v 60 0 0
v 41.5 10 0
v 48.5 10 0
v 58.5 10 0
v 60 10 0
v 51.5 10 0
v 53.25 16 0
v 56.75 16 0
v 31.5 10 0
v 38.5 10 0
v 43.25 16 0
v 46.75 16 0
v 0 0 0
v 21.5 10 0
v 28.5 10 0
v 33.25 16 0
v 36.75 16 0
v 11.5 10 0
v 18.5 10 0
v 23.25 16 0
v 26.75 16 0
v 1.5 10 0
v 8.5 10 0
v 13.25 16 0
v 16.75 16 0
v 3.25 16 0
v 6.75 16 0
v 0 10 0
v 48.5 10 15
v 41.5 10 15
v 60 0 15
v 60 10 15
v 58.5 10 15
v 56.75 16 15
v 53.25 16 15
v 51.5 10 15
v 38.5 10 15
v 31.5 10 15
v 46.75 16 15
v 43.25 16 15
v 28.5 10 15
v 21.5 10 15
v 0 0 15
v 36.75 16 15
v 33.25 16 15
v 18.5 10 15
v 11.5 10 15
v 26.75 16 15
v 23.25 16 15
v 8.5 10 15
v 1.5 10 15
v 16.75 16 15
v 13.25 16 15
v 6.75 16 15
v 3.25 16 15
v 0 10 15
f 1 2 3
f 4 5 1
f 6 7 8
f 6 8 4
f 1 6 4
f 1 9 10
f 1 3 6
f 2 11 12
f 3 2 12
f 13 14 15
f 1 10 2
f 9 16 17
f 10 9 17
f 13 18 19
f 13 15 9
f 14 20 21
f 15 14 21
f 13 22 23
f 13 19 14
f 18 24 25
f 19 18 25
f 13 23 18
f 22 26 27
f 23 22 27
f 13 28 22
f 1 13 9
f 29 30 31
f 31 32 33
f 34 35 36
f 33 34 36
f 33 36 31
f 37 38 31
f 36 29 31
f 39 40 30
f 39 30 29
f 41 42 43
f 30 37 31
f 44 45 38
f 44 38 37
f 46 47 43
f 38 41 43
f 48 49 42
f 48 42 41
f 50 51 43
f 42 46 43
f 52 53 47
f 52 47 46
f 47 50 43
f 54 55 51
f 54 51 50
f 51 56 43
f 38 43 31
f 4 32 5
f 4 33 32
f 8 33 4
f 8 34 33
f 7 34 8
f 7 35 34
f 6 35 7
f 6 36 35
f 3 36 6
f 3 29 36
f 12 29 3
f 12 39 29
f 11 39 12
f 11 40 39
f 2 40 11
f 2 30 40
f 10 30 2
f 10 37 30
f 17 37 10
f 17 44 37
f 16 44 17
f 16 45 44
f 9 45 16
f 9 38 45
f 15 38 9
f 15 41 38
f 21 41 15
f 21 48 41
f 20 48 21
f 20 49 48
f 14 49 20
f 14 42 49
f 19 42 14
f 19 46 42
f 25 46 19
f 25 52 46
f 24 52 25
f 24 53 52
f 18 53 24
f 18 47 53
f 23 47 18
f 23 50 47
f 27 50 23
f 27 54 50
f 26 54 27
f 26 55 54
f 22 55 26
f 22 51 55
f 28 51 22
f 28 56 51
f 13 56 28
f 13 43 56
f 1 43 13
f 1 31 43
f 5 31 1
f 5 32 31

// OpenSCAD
$fn = 32;

// ----------------------------------------------------------------------
// Gear rack: 6 teeth, pitch 10 mm
// ----------------------------------------------------------------------

// --- parameters (mm) ---
teeth = 6;                // number of teeth
pitch = 10;               // tooth pitch, X
root_w = 7;               // tooth width at the root
tip_w = 3.5;              // tooth width at the tip
base_h = 10;              // rack body height, Y
tooth_h = 6;              // tooth height above the body
plate_t = 15;             // rack width, Z (extrusion height)
fit_tol = 0.05;           // declared fit tolerance (prompt contract)
free_tol = 0.2;           // declared free tolerance (prompt contract)

rack_l = teeth * pitch;  // overall length
total_h = base_h + tooth_h;  // overall height

profile = [[0, 0], [60, 0], [60, 10], [58.5, 10], [56.75, 16], [53.25, 16], [51.5, 10], [48.5, 10], [46.75, 16], [43.25, 16], [41.5, 10], [38.5, 10], [36.75, 16], [33.25, 16], [31.5, 10], [28.5, 10], [26.75, 16], [23.25, 16], [21.5, 10], [18.5, 10], [16.75, 16], [13.25, 16], [11.5, 10], [8.5, 10], [6.75, 16], [3.25, 16], [1.5, 10], [0, 10]];  // primary outline, 28 points, counter clockwise

// --- the one profile operation ---
linear_extrude(height = plate_t) polygon(points = profile);
